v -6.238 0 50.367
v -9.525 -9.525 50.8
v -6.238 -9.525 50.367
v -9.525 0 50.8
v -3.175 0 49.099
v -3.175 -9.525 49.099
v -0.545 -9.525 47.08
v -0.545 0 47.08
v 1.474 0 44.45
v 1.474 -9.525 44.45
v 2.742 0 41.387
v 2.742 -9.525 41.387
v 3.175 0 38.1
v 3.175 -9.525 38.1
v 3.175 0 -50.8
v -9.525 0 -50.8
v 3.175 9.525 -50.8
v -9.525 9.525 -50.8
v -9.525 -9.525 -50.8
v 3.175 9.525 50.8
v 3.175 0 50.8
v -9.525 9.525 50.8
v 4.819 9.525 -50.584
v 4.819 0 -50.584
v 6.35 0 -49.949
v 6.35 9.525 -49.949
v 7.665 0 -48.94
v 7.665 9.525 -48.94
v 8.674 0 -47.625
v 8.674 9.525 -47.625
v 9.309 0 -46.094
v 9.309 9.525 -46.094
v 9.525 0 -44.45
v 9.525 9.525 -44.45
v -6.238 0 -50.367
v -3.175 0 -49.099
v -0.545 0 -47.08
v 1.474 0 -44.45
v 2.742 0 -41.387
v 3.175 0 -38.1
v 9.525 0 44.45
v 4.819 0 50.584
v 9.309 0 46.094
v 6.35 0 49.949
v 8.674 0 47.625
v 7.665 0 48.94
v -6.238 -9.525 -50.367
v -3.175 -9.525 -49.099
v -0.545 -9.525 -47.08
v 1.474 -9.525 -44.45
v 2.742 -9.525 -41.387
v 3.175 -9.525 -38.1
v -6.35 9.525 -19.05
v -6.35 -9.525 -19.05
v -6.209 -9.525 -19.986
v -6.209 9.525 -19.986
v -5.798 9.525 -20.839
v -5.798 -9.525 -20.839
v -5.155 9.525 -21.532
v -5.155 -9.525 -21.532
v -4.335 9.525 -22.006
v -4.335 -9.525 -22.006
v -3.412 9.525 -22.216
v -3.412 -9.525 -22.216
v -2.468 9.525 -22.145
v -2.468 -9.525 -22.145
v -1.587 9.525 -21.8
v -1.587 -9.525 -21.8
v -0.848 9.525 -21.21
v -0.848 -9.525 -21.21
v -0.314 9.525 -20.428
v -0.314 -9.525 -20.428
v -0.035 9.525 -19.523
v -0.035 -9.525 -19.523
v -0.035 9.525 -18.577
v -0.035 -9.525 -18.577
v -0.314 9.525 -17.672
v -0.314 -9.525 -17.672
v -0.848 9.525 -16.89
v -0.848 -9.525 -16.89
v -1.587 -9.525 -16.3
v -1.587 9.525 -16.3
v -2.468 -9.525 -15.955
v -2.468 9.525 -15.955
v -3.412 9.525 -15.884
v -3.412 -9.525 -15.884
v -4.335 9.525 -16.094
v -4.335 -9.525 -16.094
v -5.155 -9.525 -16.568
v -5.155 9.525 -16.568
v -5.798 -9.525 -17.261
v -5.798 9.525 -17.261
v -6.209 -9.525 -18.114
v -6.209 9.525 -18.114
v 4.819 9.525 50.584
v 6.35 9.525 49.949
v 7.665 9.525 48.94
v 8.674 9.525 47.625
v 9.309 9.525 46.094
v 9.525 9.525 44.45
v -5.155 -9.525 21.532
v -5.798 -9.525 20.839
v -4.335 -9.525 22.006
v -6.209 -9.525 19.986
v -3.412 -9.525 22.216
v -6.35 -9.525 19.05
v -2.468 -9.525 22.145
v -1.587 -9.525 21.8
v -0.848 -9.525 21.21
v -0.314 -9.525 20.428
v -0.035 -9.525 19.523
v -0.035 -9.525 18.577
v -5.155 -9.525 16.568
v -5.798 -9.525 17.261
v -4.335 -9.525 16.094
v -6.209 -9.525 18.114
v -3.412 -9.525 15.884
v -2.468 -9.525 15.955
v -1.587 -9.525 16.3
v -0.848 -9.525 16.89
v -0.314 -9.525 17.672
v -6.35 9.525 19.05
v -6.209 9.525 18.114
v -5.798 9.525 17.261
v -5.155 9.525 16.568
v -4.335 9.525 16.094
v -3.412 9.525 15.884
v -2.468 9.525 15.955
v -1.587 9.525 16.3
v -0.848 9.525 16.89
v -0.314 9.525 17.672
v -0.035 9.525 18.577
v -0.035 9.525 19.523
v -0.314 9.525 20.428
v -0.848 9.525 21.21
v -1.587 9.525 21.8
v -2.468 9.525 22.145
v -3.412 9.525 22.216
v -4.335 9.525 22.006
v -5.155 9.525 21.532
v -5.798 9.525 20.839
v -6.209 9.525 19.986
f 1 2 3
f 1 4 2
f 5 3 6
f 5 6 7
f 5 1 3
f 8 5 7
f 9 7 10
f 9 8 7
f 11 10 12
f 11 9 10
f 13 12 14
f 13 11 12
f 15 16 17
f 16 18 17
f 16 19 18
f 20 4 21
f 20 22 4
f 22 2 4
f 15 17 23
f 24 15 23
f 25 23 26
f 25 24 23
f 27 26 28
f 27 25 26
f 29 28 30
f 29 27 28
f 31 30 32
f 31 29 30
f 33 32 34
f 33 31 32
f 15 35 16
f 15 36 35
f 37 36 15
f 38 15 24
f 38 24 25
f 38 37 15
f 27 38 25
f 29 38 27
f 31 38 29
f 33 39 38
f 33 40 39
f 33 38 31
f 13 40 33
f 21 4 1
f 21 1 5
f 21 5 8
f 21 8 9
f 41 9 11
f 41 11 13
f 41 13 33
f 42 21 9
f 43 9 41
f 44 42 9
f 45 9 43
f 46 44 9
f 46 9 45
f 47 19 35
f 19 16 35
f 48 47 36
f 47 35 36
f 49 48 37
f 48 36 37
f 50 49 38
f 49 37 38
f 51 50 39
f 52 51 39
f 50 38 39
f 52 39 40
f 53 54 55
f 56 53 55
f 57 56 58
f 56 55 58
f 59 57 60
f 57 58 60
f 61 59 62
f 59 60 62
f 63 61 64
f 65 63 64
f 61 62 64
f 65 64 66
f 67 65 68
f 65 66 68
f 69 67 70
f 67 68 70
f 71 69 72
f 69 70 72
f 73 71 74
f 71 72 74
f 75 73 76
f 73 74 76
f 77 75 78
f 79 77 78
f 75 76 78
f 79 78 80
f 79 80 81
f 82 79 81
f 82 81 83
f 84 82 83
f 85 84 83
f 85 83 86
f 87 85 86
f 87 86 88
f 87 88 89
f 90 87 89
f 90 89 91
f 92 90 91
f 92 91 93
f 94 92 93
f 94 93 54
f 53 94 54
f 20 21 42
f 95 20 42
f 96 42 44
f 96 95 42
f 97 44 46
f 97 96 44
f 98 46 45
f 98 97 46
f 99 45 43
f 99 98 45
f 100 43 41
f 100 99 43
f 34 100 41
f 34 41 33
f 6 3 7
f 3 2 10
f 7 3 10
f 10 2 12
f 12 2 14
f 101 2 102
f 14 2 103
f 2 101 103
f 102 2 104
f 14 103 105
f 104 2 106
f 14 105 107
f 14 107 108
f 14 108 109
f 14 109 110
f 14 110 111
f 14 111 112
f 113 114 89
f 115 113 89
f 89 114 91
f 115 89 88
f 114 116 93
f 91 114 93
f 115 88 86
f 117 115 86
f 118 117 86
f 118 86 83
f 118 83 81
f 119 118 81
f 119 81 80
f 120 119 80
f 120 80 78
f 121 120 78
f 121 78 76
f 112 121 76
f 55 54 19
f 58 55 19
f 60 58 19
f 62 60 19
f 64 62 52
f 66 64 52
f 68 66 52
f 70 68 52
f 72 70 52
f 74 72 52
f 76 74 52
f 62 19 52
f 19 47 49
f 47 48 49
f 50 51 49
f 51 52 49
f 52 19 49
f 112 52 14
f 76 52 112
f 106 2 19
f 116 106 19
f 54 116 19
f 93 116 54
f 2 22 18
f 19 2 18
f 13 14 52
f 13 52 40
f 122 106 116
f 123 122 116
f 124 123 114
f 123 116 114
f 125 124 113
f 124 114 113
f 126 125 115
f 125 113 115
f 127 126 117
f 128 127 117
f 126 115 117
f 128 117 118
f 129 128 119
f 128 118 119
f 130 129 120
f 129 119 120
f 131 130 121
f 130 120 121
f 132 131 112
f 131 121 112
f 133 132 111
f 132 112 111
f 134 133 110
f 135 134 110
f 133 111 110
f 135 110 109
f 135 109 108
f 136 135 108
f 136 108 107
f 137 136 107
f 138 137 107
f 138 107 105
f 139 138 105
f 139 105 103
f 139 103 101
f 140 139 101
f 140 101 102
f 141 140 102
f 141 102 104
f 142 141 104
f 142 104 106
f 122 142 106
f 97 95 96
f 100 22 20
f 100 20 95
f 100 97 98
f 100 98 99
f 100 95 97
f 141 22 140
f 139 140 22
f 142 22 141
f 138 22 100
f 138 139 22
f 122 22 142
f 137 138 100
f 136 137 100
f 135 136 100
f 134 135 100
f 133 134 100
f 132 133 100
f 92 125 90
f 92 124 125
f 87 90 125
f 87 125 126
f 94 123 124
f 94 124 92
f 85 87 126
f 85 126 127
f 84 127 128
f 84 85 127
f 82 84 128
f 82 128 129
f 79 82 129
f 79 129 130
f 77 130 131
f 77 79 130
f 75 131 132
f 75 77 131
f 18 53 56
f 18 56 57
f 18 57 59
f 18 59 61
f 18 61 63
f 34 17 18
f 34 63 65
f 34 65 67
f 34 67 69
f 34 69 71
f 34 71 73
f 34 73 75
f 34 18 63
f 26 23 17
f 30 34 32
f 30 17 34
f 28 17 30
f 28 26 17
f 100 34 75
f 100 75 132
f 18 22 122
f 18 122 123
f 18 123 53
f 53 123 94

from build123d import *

# Parameters (mm, degrees)
SKETCH1_W                       = 19.05
SKETCH1_H                       = 101.6
BOSS_EXTRUDE1_DEPTH             = 9.525
SKETCH2_W                       = 6.35
SKETCH2_H                       = 9.525
CUT_EXTRUDE1_DEPTH              = 103.489078686
F_1_4_0_25_DIAMETER_HOLE1_D     = 6.35
F_1_4_0_25_DIAMETER_HOLE1_DEPTH = 25.4
F_1_4_0_25_DIAMETER_HOLE1_TIP   = 1.907732465
FILLET1_R                       = 12.7
FILLET2_R                       = 6.35


with BuildPart() as part:
    # Sketch1 → Boss-Extrude1 (new, symmetric)
    with BuildSketch(Plane(origin=(0, 0, 0), x_dir=(1, 0, 0), z_dir=(0, 1, 0))):
        Rectangle(SKETCH1_W, SKETCH1_H)
    extrude(amount=BOSS_EXTRUDE1_DEPTH, both=True)

    # Sketch2 → Cut-Extrude1 (cut, through all)
    with BuildSketch(Plane.XY.offset(50.8)):
        with Locations((6.35, -4.7625)):
            Rectangle(SKETCH2_W, SKETCH2_H)
    extrude(amount=-CUT_EXTRUDE1_DEPTH, mode=Mode.SUBTRACT)

    # 1/4 (0.25) Diameter Hole1
    with Locations(Plane(origin=(0, 9.525, 0), x_dir=(1, 0, 0), z_dir=(0, 1, 0))):
        with Locations((-3.175, 19.05), (-3.175, -19.05)):
            Hole(F_1_4_0_25_DIAMETER_HOLE1_D / 2, depth=F_1_4_0_25_DIAMETER_HOLE1_DEPTH)
            with Locations((0, 0, -(F_1_4_0_25_DIAMETER_HOLE1_DEPTH + F_1_4_0_25_DIAMETER_HOLE1_TIP / 2))):  # 118° drill point
                Cone(0, F_1_4_0_25_DIAMETER_HOLE1_D / 2, F_1_4_0_25_DIAMETER_HOLE1_TIP, mode=Mode.SUBTRACT)

    # Fillet1
    fillet1_edges = [part.edges().sort_by_distance(p)[0] for p in [
        (3.175, -4.7625, -50.8),
        (3.175, -4.7625, 50.8),
    ]]
    fillet(fillet1_edges, radius=FILLET1_R - 0.0001)  # a hair under: the kernel refuses the full size

    # Fillet2
    fillet2_edges = [part.edges().sort_by_distance(p)[0] for p in [
        (9.525, 4.7625, -50.8),
        (9.525, 4.7625, 50.8),
    ]]
    fillet(fillet2_edges, radius=FILLET2_R)


solid = part.part
